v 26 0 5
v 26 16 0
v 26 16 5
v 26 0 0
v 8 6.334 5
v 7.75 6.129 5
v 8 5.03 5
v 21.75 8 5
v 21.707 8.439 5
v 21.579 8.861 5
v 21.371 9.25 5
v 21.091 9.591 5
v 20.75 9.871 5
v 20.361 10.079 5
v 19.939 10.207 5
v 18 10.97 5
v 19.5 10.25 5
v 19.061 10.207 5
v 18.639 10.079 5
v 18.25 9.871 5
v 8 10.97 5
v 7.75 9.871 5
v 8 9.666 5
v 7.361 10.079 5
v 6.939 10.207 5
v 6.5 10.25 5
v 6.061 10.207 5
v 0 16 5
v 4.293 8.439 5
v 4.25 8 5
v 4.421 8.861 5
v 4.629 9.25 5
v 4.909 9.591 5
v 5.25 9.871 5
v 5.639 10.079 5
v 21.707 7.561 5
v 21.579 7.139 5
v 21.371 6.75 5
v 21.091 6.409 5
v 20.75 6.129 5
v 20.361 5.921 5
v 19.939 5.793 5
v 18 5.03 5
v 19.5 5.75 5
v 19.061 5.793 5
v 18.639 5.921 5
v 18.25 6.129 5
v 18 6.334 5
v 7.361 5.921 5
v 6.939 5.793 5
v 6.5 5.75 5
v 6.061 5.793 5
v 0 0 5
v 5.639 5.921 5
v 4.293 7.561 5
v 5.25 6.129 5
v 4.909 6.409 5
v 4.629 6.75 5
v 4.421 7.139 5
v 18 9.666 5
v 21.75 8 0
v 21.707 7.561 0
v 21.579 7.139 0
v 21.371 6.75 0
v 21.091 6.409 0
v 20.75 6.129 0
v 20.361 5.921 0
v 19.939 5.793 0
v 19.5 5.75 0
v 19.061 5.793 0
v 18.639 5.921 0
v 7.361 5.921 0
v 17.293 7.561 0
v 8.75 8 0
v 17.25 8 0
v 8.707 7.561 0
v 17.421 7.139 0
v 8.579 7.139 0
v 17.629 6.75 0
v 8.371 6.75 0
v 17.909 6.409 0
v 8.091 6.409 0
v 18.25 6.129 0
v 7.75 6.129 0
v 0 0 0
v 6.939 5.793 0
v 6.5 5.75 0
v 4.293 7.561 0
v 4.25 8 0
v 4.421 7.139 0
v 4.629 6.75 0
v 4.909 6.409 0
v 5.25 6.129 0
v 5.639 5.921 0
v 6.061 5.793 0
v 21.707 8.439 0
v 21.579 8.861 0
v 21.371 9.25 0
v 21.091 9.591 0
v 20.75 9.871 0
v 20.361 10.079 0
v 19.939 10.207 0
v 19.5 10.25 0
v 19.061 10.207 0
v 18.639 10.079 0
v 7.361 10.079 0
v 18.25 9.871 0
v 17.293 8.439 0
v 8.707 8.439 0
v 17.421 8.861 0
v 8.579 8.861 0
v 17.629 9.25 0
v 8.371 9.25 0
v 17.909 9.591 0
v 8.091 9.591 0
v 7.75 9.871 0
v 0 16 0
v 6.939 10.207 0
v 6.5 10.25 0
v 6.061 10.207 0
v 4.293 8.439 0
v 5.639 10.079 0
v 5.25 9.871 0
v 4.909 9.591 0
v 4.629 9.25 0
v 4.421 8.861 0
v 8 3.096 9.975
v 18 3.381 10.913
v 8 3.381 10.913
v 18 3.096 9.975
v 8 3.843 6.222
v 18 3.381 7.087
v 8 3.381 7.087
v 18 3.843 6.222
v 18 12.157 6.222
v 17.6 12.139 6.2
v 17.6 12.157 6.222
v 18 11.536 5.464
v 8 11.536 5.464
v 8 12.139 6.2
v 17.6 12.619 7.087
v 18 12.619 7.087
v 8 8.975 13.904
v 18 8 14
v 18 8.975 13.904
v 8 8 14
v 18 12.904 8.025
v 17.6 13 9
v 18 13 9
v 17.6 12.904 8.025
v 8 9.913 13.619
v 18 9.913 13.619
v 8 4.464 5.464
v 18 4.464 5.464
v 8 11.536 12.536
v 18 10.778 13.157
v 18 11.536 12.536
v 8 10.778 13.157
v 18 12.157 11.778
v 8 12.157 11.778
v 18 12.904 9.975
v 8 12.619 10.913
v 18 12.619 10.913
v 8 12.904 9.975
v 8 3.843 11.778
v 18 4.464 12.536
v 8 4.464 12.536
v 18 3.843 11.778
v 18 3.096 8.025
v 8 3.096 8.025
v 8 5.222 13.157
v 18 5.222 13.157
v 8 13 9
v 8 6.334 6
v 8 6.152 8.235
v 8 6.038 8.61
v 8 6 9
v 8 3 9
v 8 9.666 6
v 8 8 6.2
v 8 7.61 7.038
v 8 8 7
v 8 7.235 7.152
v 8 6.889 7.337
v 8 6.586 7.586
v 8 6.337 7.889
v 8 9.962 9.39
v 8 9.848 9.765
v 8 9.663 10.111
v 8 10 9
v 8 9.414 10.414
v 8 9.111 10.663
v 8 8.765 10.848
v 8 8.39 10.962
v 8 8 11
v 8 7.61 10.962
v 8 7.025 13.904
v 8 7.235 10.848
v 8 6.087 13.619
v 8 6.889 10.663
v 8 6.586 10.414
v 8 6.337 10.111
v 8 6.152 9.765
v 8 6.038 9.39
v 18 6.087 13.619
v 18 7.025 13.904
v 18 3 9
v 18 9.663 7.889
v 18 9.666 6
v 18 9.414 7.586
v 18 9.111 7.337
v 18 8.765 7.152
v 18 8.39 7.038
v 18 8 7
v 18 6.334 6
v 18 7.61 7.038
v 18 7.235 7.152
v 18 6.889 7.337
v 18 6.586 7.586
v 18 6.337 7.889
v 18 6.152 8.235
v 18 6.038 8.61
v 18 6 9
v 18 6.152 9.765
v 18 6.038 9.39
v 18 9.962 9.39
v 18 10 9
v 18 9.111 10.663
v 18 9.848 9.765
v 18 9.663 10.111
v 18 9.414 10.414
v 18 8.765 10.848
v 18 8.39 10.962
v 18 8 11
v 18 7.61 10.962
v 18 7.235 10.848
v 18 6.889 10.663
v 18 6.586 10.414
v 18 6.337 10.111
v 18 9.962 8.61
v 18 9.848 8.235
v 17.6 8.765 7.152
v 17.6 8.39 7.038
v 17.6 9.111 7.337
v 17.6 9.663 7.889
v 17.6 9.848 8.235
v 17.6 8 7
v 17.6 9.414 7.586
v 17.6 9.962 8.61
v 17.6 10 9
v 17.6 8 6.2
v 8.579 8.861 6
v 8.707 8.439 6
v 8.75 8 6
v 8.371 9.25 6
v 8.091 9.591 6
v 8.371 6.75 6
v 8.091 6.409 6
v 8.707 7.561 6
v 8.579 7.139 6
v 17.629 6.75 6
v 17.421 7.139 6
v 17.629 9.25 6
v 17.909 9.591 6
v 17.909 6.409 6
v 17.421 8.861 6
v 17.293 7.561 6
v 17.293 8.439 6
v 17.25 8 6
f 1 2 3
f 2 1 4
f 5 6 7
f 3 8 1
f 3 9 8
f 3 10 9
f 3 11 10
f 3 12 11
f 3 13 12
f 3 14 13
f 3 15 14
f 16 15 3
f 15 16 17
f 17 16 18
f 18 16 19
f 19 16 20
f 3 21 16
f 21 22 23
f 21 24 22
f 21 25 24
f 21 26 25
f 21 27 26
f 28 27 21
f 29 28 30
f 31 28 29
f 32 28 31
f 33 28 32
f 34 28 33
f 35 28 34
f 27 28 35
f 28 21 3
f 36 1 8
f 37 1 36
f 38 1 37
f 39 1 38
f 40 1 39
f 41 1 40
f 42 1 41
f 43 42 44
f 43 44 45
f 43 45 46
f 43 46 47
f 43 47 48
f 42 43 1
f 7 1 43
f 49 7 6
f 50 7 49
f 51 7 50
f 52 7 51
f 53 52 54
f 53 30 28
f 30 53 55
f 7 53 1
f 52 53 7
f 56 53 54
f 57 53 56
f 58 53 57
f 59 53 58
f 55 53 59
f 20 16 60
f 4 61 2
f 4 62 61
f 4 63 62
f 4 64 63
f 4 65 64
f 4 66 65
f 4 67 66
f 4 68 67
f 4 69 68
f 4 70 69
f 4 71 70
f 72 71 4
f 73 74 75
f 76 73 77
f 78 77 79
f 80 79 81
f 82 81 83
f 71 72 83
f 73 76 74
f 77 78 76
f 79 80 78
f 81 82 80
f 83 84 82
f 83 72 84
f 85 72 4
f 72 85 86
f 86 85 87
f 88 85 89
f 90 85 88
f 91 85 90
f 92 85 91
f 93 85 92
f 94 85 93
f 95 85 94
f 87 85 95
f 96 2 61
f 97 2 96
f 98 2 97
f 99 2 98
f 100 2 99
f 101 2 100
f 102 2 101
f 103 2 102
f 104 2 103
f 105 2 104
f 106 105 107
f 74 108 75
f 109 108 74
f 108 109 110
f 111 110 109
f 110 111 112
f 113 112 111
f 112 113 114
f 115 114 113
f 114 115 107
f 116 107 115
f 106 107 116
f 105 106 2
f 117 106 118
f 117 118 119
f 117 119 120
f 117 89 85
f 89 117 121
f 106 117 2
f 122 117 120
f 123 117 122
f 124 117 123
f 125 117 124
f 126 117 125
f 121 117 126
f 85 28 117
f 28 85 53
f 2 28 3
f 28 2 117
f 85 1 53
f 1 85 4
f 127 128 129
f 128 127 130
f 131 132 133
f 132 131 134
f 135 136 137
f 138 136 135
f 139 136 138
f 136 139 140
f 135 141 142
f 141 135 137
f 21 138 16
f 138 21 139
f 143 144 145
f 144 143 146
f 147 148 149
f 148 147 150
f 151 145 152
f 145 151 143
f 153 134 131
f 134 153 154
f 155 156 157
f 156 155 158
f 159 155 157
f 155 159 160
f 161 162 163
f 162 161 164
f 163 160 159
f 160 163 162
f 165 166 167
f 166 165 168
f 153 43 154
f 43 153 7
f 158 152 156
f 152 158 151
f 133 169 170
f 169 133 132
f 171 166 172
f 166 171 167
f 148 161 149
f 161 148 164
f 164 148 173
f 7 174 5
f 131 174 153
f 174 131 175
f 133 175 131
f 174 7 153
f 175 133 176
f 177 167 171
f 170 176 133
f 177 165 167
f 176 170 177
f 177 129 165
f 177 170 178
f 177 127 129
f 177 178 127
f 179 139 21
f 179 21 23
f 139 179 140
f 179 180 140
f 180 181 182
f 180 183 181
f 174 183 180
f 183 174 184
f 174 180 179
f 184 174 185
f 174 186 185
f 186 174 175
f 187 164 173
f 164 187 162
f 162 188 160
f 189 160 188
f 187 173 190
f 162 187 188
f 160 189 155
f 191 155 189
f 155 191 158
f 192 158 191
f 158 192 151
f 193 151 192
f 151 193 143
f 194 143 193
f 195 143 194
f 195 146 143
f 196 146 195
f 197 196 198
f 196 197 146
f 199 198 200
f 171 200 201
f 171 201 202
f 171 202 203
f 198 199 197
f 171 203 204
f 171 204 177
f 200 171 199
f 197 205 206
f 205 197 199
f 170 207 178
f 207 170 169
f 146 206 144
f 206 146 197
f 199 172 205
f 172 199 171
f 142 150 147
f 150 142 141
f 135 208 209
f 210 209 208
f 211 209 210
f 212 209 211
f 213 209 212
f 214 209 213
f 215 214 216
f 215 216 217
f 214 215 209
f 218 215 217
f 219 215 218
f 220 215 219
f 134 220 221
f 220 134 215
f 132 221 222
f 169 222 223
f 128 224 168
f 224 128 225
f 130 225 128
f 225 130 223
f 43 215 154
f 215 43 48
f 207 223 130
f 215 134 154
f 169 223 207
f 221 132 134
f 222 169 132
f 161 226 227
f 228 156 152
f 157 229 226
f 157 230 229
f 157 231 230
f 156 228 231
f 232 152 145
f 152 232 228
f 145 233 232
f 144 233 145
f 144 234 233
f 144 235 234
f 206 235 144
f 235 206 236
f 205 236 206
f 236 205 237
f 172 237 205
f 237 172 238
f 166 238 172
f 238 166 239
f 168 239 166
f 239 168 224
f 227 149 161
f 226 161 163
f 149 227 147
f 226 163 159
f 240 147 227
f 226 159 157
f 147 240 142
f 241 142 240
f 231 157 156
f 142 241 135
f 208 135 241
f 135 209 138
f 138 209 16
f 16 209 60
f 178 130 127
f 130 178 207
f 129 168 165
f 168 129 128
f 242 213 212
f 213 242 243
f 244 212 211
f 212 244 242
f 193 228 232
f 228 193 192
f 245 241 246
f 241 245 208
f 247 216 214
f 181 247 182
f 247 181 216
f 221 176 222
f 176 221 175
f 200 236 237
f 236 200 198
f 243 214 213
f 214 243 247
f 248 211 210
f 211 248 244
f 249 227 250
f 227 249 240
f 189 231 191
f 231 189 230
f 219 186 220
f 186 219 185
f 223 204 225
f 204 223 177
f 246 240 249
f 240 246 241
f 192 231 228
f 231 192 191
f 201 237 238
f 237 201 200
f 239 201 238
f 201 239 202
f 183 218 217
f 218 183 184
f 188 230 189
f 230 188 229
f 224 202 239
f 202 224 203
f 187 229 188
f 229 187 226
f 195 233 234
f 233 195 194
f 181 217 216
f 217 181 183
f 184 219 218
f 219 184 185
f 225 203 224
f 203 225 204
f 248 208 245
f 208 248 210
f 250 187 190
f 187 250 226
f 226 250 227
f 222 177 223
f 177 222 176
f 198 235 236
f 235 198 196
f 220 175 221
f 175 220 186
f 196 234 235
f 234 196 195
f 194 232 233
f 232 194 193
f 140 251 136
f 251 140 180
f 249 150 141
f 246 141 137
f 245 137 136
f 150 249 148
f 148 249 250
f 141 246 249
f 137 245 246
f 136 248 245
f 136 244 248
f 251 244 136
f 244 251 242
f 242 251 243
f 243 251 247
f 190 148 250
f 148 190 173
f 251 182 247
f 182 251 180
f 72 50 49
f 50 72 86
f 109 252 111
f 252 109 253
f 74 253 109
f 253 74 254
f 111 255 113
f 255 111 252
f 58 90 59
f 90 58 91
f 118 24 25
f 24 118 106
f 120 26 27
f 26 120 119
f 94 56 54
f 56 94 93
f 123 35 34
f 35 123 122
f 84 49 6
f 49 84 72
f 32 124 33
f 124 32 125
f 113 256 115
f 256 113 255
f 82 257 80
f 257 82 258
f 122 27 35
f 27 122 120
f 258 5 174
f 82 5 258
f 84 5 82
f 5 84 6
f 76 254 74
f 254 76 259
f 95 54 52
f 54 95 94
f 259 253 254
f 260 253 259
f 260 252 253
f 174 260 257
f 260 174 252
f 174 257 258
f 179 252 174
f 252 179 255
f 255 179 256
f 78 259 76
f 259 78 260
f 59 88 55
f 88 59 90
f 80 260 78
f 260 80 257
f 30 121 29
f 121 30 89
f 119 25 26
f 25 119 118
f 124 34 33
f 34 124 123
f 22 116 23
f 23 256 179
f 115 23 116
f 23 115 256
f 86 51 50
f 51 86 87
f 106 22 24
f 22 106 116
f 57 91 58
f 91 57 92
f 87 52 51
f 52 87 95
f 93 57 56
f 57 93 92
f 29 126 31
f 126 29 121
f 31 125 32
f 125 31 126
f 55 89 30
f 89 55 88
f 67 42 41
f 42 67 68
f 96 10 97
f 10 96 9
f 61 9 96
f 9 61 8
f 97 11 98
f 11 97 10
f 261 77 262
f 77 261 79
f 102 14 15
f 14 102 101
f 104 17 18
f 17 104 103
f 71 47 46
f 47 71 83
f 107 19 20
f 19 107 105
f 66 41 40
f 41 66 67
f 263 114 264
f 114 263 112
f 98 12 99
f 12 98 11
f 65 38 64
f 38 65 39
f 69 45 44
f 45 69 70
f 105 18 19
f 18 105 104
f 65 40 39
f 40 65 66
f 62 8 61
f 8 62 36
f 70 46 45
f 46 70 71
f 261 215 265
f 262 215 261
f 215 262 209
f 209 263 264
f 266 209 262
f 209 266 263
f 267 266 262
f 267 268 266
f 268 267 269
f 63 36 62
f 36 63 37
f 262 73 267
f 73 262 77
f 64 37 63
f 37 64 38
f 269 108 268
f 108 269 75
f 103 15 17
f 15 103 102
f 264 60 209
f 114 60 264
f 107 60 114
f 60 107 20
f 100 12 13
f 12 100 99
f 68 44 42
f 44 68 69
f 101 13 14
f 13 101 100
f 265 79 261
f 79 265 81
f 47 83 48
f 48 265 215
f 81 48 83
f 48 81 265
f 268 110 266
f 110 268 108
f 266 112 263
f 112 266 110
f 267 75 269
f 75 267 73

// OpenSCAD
$fn = 32;

// ----------------------------------------------------------------------
// Cable clip: cable 4 mm, clamp 10 mm, base 26 mm
// ----------------------------------------------------------------------

// --- parameters (mm) ---
base_w = 26;              // base length, X
base_d = 16;              // base width, Y
base_t = 5;               // base thickness
clamp_d = 10;             // clamp outside diameter
wall_t = 3;               // clamp wall
cable_d = 4;              // cable opening
ring_w = 10;              // clamp width along the cable
screw_d = 4.5;            // screw clearance
throat = 2.8;             // snap throat width
sink = 1;                 // overlap of the clamp into the base

module base() {
  cube([base_w, base_d, base_t]);
}

module clamp() {
  translate([base_w / 2, base_d / 2, base_t + clamp_d / 2 - sink]) rotate([0, 90, 0])
    cylinder(h = ring_w, d = clamp_d, center = true);
}

difference() {
  union() {
    base();
    clamp();
  }
  translate([base_w / 2, base_d / 2, base_t + clamp_d / 2 - sink]) rotate([0, 90, 0]) translate([0, 0, -ring_w / 2 - 1]) cylinder(h = ring_w + 2, d = cable_d);
  /* snap throat: the opening is narrower than the cable */
  translate([base_w / 2 - throat / 2, base_d / 2, base_t + clamp_d / 2 - sink]) rotate([0, 90, 0]) translate([0, 0, -ring_w / 2 - 1]) cube([throat, clamp_d + 2, ring_w + 2]);
  translate([6.5, base_d / 2, -1]) cylinder(h = base_t + 2, d = screw_d);
  translate([19.5, base_d / 2, -1]) cylinder(h = base_t + 2, d = screw_d);
}
